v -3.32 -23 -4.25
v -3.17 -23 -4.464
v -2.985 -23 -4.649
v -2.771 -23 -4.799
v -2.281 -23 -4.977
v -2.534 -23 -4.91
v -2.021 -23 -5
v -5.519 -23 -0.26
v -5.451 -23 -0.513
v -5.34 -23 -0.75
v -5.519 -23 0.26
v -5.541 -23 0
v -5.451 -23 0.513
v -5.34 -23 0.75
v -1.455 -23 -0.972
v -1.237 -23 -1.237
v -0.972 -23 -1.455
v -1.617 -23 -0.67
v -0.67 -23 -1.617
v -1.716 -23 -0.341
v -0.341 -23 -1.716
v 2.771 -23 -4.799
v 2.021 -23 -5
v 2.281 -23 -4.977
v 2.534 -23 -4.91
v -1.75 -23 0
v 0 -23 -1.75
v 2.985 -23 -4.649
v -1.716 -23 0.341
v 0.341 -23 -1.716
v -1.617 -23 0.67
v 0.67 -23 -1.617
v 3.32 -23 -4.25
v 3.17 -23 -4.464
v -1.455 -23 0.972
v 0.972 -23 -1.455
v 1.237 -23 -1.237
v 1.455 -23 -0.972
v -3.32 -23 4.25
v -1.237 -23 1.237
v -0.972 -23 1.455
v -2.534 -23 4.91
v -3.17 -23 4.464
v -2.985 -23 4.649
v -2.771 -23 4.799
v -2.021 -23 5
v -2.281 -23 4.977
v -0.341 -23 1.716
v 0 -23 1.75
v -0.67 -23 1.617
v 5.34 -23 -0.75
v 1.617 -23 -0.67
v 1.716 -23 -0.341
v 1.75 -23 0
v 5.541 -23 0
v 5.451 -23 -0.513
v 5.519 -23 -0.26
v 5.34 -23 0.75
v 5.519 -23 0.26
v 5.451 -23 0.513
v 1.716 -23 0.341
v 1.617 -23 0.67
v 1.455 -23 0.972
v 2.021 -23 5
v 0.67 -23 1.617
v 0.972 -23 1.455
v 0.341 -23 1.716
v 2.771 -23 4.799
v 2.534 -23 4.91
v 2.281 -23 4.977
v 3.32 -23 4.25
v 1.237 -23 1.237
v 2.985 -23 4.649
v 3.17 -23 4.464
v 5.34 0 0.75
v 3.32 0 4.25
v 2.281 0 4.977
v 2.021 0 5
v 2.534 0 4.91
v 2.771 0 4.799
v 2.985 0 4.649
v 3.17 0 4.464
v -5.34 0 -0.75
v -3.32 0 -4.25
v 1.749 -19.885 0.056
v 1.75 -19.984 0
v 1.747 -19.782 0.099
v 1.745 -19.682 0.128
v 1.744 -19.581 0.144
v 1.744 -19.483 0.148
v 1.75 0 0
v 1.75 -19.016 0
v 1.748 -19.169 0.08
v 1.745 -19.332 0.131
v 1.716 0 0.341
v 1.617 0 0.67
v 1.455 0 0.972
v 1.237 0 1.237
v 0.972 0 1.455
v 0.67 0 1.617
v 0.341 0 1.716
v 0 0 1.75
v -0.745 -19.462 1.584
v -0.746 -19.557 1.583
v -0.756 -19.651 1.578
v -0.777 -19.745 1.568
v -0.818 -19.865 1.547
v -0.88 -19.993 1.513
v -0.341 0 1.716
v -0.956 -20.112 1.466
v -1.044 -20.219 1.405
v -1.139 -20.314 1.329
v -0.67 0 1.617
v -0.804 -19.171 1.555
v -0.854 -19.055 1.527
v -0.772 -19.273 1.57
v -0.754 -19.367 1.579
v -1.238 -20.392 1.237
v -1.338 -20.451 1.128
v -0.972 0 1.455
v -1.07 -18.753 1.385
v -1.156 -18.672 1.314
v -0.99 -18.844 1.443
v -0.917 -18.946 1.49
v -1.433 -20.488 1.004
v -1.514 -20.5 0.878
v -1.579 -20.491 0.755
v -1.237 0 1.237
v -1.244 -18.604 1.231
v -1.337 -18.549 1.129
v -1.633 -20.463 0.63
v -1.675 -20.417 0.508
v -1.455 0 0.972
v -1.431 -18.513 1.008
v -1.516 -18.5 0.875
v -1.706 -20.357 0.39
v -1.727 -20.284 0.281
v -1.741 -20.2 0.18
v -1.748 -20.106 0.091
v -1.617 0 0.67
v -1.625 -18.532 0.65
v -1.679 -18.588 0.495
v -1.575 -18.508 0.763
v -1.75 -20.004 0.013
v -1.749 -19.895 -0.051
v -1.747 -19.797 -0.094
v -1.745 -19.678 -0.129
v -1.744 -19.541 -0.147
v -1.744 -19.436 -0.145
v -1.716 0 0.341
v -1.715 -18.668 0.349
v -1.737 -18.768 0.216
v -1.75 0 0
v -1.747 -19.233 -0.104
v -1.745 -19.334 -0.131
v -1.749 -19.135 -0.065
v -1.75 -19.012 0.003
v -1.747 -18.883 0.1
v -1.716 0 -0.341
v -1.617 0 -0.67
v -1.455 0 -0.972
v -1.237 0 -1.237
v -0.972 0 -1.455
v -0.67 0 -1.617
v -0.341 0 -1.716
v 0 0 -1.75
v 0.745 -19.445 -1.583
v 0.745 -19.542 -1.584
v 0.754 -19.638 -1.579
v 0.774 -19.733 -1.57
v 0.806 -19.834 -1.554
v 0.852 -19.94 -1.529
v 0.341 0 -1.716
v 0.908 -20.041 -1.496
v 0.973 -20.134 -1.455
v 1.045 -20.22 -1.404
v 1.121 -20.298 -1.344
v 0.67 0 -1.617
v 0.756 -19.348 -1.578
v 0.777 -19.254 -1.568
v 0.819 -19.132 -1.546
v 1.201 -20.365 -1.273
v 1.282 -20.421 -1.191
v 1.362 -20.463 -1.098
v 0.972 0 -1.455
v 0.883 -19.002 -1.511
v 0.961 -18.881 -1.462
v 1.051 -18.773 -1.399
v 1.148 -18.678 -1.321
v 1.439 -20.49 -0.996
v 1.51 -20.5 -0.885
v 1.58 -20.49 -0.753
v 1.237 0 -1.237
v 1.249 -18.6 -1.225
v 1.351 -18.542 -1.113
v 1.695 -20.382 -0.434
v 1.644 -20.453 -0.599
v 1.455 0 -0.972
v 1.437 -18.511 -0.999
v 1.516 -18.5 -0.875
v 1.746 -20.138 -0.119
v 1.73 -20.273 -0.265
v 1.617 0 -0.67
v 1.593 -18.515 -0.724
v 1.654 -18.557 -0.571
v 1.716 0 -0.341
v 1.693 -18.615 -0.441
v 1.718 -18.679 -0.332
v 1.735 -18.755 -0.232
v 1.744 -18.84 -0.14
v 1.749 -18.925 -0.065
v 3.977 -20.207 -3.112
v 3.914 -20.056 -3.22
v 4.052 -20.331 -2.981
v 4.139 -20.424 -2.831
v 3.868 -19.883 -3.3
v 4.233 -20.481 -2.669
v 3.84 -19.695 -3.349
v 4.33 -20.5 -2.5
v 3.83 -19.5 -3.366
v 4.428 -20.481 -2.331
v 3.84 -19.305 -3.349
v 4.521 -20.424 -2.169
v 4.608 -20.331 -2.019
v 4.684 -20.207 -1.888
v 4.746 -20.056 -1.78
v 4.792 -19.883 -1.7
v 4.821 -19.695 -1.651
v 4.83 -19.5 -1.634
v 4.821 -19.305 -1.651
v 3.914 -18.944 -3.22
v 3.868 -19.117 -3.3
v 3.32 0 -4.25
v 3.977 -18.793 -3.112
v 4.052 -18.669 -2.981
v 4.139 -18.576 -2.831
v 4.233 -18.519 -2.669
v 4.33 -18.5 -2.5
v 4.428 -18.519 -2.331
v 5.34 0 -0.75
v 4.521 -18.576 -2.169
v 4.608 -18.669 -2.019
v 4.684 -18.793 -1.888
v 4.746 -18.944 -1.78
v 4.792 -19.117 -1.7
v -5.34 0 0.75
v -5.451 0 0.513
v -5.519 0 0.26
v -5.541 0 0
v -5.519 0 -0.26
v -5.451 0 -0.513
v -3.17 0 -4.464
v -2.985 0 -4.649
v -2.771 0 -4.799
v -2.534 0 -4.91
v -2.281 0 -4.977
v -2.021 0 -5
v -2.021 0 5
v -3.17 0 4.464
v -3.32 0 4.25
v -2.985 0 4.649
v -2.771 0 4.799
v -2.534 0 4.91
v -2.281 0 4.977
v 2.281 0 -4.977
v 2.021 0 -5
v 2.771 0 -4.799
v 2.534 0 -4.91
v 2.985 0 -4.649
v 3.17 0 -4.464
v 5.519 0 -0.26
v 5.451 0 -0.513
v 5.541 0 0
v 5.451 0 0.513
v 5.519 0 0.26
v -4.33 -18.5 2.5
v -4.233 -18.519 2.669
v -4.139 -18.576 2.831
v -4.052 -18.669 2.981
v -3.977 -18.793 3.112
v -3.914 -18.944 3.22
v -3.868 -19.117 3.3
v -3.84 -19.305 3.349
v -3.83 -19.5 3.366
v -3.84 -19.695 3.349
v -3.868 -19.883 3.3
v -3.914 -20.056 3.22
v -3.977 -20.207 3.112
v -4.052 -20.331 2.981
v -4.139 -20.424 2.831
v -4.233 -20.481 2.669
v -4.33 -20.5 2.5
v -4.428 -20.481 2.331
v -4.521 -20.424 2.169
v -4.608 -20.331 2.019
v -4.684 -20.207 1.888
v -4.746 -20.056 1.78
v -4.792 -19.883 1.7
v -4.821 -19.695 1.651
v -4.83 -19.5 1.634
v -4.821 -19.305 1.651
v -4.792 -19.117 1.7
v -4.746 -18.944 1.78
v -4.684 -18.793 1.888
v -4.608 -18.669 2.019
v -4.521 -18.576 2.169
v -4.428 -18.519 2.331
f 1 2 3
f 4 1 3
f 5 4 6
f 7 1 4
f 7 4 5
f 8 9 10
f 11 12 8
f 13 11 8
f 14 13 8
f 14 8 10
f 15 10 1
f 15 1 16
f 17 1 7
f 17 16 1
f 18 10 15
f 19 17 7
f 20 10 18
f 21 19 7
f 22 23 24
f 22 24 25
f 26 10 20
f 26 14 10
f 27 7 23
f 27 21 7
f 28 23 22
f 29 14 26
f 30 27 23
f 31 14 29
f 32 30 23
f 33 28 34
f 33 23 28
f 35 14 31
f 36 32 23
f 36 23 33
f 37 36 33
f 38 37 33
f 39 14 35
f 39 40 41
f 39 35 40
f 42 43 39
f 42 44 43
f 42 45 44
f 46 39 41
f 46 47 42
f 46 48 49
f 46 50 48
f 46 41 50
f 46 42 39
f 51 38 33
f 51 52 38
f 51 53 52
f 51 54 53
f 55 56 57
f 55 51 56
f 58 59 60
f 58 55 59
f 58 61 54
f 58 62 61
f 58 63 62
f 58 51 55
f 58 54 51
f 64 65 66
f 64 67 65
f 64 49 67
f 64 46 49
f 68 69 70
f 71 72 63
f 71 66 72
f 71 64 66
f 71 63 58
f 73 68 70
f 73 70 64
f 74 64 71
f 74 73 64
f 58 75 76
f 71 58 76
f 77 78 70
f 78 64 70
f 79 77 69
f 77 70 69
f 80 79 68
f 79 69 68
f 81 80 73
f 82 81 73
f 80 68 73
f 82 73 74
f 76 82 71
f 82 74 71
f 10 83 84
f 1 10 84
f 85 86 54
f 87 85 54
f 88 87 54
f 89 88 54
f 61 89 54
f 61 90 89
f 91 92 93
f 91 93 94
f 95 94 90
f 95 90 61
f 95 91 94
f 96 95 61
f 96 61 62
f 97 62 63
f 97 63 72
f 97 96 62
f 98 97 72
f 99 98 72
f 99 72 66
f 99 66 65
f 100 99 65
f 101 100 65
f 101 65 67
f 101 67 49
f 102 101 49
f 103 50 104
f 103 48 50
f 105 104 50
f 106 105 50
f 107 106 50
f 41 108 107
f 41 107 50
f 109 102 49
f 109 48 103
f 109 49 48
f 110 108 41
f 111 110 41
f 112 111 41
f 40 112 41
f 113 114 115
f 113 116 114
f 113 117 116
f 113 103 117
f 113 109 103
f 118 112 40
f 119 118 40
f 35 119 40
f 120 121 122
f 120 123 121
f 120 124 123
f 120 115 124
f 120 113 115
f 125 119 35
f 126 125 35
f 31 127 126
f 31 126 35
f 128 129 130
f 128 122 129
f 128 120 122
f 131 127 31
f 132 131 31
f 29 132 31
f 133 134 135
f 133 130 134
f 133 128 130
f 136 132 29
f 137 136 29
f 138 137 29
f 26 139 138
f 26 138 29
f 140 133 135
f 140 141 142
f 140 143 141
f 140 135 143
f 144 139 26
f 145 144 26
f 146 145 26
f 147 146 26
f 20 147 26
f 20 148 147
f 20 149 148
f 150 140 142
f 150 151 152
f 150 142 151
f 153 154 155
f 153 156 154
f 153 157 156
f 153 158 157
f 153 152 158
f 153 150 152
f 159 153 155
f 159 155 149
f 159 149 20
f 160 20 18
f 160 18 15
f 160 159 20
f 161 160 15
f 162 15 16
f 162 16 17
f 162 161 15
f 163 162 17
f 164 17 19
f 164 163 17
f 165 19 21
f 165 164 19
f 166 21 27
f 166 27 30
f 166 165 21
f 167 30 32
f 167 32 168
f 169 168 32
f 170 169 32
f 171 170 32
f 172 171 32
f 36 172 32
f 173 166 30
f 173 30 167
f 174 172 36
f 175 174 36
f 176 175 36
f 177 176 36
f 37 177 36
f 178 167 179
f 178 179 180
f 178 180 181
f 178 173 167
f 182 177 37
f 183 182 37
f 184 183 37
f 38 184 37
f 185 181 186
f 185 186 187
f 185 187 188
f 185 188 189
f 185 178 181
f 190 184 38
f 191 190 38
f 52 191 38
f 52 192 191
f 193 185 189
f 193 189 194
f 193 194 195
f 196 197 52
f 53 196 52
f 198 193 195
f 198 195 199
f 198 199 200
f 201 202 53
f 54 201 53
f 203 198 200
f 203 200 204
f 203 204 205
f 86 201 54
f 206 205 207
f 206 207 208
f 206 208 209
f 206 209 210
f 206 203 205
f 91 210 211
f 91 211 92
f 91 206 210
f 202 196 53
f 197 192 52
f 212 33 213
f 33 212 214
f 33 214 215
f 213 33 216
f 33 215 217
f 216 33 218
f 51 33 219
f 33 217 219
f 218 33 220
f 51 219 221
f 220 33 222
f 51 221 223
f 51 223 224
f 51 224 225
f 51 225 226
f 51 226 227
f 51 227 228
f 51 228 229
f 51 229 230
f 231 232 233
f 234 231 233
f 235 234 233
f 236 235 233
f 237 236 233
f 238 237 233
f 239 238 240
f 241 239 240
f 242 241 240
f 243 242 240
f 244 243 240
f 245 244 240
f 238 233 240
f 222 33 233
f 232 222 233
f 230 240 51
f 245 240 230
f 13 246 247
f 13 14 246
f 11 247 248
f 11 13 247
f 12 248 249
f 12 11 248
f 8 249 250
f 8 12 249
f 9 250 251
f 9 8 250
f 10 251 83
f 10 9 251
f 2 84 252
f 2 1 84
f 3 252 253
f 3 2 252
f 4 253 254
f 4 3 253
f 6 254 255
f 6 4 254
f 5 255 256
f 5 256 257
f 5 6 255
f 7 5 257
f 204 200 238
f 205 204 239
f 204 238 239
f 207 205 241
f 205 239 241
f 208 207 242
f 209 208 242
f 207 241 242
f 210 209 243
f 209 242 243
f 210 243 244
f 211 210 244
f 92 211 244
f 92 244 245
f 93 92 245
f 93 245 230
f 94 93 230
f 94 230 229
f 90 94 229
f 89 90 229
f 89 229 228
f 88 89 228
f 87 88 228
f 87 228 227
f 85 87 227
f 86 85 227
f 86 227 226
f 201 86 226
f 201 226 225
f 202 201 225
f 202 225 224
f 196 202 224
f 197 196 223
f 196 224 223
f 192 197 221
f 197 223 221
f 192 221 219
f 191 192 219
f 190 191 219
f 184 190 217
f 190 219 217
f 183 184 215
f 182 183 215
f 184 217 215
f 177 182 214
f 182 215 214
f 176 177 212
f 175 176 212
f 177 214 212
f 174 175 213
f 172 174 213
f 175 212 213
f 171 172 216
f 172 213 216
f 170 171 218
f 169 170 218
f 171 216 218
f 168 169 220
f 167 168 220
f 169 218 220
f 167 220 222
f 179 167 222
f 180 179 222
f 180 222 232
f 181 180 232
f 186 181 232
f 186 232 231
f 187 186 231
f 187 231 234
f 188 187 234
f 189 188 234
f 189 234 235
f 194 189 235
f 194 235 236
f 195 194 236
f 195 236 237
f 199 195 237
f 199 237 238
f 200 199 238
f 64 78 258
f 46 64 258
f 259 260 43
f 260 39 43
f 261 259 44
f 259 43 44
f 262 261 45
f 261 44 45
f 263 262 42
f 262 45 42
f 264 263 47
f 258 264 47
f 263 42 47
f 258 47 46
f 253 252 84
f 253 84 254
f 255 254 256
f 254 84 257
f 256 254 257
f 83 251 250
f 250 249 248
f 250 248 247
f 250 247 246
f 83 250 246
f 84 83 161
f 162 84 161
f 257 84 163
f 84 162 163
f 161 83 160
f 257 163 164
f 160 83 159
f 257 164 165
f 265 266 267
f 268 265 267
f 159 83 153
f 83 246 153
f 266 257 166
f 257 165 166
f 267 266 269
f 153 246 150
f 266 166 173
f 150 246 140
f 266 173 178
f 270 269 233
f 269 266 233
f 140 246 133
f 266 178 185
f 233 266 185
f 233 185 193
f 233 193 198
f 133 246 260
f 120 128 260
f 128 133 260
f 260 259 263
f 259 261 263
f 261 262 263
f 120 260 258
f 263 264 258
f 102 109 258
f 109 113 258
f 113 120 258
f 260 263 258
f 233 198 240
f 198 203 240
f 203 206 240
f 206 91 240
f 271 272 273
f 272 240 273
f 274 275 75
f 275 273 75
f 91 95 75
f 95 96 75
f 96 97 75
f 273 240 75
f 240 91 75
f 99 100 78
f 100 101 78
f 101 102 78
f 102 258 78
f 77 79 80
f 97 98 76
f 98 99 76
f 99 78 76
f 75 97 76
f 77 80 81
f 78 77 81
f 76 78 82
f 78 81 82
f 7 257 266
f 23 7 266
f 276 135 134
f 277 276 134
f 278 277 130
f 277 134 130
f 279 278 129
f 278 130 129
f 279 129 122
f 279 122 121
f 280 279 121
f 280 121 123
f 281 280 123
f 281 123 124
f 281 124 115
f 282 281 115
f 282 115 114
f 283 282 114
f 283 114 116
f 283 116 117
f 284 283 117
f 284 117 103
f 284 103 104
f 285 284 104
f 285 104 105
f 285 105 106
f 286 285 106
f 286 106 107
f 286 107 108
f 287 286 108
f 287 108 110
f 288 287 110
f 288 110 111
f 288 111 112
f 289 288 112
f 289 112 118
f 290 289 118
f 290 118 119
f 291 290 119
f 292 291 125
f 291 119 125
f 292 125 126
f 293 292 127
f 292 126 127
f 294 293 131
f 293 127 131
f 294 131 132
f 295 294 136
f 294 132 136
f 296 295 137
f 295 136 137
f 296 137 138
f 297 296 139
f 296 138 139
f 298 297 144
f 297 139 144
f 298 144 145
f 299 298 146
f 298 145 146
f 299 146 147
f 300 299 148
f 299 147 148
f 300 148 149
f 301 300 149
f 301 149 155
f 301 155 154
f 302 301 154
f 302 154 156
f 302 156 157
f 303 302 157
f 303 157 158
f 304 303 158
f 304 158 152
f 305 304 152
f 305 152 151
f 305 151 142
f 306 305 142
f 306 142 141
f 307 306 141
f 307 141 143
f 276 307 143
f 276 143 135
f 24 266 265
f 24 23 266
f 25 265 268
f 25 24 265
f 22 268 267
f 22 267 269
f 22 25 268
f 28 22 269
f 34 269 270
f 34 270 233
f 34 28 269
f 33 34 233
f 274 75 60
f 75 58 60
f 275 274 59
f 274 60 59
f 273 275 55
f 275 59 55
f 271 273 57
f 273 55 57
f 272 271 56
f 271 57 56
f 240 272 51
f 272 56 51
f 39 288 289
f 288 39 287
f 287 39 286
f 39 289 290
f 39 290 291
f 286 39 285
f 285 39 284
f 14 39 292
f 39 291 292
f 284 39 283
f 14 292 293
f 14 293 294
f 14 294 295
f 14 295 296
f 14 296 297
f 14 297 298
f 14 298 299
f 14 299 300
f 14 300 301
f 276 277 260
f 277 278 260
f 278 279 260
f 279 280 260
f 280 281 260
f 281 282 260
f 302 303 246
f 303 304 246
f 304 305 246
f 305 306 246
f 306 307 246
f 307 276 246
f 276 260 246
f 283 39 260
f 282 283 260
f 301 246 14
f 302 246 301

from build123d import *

# Parameters (mm, degrees)
F0_R     = 1.75
F1_DEPTH = 23
F2_R     = 1.5
F3_R     = 1
F4_DEPTH = 10


with BuildPart() as f1:
    # F0 (on Front) → F1 (new body)
    with BuildSketch(Plane.XZ):
        Polygon((-2.886751, 5), (-5.773503, 0), (-2.886751, -5), (2.886751, -5), (5.773503, 0), (2.886751, 5), align=None)
        Circle(F0_R, mode=Mode.SUBTRACT)
    extrude(amount=F1_DEPTH)

    # F2
    f2_edges = [f1.edges().sort_by_distance(p)[0] for p in [
        (2.886751, -11.5, 5),
        (-2.886751, -11.5, 5),
        (5.773503, -11.5, 0),
        (2.886751, -11.5, -5),
        (-2.886751, -11.5, -5),
        (-5.773503, -11.5, 0),
    ]]
    fillet(f2_edges, radius=F2_R)

    # F3 (on face) → F4 (cut, through all)
    with BuildSketch(Plane(origin=(4.330127, 0, -2.5), x_dir=(0, 1, 0), z_dir=(0.866025, 0, -0.5))):
        with Locations((-19.5, 0)):
            Circle(F3_R)
    extrude(amount=-F4_DEPTH, mode=Mode.SUBTRACT)


solid = f1.part
